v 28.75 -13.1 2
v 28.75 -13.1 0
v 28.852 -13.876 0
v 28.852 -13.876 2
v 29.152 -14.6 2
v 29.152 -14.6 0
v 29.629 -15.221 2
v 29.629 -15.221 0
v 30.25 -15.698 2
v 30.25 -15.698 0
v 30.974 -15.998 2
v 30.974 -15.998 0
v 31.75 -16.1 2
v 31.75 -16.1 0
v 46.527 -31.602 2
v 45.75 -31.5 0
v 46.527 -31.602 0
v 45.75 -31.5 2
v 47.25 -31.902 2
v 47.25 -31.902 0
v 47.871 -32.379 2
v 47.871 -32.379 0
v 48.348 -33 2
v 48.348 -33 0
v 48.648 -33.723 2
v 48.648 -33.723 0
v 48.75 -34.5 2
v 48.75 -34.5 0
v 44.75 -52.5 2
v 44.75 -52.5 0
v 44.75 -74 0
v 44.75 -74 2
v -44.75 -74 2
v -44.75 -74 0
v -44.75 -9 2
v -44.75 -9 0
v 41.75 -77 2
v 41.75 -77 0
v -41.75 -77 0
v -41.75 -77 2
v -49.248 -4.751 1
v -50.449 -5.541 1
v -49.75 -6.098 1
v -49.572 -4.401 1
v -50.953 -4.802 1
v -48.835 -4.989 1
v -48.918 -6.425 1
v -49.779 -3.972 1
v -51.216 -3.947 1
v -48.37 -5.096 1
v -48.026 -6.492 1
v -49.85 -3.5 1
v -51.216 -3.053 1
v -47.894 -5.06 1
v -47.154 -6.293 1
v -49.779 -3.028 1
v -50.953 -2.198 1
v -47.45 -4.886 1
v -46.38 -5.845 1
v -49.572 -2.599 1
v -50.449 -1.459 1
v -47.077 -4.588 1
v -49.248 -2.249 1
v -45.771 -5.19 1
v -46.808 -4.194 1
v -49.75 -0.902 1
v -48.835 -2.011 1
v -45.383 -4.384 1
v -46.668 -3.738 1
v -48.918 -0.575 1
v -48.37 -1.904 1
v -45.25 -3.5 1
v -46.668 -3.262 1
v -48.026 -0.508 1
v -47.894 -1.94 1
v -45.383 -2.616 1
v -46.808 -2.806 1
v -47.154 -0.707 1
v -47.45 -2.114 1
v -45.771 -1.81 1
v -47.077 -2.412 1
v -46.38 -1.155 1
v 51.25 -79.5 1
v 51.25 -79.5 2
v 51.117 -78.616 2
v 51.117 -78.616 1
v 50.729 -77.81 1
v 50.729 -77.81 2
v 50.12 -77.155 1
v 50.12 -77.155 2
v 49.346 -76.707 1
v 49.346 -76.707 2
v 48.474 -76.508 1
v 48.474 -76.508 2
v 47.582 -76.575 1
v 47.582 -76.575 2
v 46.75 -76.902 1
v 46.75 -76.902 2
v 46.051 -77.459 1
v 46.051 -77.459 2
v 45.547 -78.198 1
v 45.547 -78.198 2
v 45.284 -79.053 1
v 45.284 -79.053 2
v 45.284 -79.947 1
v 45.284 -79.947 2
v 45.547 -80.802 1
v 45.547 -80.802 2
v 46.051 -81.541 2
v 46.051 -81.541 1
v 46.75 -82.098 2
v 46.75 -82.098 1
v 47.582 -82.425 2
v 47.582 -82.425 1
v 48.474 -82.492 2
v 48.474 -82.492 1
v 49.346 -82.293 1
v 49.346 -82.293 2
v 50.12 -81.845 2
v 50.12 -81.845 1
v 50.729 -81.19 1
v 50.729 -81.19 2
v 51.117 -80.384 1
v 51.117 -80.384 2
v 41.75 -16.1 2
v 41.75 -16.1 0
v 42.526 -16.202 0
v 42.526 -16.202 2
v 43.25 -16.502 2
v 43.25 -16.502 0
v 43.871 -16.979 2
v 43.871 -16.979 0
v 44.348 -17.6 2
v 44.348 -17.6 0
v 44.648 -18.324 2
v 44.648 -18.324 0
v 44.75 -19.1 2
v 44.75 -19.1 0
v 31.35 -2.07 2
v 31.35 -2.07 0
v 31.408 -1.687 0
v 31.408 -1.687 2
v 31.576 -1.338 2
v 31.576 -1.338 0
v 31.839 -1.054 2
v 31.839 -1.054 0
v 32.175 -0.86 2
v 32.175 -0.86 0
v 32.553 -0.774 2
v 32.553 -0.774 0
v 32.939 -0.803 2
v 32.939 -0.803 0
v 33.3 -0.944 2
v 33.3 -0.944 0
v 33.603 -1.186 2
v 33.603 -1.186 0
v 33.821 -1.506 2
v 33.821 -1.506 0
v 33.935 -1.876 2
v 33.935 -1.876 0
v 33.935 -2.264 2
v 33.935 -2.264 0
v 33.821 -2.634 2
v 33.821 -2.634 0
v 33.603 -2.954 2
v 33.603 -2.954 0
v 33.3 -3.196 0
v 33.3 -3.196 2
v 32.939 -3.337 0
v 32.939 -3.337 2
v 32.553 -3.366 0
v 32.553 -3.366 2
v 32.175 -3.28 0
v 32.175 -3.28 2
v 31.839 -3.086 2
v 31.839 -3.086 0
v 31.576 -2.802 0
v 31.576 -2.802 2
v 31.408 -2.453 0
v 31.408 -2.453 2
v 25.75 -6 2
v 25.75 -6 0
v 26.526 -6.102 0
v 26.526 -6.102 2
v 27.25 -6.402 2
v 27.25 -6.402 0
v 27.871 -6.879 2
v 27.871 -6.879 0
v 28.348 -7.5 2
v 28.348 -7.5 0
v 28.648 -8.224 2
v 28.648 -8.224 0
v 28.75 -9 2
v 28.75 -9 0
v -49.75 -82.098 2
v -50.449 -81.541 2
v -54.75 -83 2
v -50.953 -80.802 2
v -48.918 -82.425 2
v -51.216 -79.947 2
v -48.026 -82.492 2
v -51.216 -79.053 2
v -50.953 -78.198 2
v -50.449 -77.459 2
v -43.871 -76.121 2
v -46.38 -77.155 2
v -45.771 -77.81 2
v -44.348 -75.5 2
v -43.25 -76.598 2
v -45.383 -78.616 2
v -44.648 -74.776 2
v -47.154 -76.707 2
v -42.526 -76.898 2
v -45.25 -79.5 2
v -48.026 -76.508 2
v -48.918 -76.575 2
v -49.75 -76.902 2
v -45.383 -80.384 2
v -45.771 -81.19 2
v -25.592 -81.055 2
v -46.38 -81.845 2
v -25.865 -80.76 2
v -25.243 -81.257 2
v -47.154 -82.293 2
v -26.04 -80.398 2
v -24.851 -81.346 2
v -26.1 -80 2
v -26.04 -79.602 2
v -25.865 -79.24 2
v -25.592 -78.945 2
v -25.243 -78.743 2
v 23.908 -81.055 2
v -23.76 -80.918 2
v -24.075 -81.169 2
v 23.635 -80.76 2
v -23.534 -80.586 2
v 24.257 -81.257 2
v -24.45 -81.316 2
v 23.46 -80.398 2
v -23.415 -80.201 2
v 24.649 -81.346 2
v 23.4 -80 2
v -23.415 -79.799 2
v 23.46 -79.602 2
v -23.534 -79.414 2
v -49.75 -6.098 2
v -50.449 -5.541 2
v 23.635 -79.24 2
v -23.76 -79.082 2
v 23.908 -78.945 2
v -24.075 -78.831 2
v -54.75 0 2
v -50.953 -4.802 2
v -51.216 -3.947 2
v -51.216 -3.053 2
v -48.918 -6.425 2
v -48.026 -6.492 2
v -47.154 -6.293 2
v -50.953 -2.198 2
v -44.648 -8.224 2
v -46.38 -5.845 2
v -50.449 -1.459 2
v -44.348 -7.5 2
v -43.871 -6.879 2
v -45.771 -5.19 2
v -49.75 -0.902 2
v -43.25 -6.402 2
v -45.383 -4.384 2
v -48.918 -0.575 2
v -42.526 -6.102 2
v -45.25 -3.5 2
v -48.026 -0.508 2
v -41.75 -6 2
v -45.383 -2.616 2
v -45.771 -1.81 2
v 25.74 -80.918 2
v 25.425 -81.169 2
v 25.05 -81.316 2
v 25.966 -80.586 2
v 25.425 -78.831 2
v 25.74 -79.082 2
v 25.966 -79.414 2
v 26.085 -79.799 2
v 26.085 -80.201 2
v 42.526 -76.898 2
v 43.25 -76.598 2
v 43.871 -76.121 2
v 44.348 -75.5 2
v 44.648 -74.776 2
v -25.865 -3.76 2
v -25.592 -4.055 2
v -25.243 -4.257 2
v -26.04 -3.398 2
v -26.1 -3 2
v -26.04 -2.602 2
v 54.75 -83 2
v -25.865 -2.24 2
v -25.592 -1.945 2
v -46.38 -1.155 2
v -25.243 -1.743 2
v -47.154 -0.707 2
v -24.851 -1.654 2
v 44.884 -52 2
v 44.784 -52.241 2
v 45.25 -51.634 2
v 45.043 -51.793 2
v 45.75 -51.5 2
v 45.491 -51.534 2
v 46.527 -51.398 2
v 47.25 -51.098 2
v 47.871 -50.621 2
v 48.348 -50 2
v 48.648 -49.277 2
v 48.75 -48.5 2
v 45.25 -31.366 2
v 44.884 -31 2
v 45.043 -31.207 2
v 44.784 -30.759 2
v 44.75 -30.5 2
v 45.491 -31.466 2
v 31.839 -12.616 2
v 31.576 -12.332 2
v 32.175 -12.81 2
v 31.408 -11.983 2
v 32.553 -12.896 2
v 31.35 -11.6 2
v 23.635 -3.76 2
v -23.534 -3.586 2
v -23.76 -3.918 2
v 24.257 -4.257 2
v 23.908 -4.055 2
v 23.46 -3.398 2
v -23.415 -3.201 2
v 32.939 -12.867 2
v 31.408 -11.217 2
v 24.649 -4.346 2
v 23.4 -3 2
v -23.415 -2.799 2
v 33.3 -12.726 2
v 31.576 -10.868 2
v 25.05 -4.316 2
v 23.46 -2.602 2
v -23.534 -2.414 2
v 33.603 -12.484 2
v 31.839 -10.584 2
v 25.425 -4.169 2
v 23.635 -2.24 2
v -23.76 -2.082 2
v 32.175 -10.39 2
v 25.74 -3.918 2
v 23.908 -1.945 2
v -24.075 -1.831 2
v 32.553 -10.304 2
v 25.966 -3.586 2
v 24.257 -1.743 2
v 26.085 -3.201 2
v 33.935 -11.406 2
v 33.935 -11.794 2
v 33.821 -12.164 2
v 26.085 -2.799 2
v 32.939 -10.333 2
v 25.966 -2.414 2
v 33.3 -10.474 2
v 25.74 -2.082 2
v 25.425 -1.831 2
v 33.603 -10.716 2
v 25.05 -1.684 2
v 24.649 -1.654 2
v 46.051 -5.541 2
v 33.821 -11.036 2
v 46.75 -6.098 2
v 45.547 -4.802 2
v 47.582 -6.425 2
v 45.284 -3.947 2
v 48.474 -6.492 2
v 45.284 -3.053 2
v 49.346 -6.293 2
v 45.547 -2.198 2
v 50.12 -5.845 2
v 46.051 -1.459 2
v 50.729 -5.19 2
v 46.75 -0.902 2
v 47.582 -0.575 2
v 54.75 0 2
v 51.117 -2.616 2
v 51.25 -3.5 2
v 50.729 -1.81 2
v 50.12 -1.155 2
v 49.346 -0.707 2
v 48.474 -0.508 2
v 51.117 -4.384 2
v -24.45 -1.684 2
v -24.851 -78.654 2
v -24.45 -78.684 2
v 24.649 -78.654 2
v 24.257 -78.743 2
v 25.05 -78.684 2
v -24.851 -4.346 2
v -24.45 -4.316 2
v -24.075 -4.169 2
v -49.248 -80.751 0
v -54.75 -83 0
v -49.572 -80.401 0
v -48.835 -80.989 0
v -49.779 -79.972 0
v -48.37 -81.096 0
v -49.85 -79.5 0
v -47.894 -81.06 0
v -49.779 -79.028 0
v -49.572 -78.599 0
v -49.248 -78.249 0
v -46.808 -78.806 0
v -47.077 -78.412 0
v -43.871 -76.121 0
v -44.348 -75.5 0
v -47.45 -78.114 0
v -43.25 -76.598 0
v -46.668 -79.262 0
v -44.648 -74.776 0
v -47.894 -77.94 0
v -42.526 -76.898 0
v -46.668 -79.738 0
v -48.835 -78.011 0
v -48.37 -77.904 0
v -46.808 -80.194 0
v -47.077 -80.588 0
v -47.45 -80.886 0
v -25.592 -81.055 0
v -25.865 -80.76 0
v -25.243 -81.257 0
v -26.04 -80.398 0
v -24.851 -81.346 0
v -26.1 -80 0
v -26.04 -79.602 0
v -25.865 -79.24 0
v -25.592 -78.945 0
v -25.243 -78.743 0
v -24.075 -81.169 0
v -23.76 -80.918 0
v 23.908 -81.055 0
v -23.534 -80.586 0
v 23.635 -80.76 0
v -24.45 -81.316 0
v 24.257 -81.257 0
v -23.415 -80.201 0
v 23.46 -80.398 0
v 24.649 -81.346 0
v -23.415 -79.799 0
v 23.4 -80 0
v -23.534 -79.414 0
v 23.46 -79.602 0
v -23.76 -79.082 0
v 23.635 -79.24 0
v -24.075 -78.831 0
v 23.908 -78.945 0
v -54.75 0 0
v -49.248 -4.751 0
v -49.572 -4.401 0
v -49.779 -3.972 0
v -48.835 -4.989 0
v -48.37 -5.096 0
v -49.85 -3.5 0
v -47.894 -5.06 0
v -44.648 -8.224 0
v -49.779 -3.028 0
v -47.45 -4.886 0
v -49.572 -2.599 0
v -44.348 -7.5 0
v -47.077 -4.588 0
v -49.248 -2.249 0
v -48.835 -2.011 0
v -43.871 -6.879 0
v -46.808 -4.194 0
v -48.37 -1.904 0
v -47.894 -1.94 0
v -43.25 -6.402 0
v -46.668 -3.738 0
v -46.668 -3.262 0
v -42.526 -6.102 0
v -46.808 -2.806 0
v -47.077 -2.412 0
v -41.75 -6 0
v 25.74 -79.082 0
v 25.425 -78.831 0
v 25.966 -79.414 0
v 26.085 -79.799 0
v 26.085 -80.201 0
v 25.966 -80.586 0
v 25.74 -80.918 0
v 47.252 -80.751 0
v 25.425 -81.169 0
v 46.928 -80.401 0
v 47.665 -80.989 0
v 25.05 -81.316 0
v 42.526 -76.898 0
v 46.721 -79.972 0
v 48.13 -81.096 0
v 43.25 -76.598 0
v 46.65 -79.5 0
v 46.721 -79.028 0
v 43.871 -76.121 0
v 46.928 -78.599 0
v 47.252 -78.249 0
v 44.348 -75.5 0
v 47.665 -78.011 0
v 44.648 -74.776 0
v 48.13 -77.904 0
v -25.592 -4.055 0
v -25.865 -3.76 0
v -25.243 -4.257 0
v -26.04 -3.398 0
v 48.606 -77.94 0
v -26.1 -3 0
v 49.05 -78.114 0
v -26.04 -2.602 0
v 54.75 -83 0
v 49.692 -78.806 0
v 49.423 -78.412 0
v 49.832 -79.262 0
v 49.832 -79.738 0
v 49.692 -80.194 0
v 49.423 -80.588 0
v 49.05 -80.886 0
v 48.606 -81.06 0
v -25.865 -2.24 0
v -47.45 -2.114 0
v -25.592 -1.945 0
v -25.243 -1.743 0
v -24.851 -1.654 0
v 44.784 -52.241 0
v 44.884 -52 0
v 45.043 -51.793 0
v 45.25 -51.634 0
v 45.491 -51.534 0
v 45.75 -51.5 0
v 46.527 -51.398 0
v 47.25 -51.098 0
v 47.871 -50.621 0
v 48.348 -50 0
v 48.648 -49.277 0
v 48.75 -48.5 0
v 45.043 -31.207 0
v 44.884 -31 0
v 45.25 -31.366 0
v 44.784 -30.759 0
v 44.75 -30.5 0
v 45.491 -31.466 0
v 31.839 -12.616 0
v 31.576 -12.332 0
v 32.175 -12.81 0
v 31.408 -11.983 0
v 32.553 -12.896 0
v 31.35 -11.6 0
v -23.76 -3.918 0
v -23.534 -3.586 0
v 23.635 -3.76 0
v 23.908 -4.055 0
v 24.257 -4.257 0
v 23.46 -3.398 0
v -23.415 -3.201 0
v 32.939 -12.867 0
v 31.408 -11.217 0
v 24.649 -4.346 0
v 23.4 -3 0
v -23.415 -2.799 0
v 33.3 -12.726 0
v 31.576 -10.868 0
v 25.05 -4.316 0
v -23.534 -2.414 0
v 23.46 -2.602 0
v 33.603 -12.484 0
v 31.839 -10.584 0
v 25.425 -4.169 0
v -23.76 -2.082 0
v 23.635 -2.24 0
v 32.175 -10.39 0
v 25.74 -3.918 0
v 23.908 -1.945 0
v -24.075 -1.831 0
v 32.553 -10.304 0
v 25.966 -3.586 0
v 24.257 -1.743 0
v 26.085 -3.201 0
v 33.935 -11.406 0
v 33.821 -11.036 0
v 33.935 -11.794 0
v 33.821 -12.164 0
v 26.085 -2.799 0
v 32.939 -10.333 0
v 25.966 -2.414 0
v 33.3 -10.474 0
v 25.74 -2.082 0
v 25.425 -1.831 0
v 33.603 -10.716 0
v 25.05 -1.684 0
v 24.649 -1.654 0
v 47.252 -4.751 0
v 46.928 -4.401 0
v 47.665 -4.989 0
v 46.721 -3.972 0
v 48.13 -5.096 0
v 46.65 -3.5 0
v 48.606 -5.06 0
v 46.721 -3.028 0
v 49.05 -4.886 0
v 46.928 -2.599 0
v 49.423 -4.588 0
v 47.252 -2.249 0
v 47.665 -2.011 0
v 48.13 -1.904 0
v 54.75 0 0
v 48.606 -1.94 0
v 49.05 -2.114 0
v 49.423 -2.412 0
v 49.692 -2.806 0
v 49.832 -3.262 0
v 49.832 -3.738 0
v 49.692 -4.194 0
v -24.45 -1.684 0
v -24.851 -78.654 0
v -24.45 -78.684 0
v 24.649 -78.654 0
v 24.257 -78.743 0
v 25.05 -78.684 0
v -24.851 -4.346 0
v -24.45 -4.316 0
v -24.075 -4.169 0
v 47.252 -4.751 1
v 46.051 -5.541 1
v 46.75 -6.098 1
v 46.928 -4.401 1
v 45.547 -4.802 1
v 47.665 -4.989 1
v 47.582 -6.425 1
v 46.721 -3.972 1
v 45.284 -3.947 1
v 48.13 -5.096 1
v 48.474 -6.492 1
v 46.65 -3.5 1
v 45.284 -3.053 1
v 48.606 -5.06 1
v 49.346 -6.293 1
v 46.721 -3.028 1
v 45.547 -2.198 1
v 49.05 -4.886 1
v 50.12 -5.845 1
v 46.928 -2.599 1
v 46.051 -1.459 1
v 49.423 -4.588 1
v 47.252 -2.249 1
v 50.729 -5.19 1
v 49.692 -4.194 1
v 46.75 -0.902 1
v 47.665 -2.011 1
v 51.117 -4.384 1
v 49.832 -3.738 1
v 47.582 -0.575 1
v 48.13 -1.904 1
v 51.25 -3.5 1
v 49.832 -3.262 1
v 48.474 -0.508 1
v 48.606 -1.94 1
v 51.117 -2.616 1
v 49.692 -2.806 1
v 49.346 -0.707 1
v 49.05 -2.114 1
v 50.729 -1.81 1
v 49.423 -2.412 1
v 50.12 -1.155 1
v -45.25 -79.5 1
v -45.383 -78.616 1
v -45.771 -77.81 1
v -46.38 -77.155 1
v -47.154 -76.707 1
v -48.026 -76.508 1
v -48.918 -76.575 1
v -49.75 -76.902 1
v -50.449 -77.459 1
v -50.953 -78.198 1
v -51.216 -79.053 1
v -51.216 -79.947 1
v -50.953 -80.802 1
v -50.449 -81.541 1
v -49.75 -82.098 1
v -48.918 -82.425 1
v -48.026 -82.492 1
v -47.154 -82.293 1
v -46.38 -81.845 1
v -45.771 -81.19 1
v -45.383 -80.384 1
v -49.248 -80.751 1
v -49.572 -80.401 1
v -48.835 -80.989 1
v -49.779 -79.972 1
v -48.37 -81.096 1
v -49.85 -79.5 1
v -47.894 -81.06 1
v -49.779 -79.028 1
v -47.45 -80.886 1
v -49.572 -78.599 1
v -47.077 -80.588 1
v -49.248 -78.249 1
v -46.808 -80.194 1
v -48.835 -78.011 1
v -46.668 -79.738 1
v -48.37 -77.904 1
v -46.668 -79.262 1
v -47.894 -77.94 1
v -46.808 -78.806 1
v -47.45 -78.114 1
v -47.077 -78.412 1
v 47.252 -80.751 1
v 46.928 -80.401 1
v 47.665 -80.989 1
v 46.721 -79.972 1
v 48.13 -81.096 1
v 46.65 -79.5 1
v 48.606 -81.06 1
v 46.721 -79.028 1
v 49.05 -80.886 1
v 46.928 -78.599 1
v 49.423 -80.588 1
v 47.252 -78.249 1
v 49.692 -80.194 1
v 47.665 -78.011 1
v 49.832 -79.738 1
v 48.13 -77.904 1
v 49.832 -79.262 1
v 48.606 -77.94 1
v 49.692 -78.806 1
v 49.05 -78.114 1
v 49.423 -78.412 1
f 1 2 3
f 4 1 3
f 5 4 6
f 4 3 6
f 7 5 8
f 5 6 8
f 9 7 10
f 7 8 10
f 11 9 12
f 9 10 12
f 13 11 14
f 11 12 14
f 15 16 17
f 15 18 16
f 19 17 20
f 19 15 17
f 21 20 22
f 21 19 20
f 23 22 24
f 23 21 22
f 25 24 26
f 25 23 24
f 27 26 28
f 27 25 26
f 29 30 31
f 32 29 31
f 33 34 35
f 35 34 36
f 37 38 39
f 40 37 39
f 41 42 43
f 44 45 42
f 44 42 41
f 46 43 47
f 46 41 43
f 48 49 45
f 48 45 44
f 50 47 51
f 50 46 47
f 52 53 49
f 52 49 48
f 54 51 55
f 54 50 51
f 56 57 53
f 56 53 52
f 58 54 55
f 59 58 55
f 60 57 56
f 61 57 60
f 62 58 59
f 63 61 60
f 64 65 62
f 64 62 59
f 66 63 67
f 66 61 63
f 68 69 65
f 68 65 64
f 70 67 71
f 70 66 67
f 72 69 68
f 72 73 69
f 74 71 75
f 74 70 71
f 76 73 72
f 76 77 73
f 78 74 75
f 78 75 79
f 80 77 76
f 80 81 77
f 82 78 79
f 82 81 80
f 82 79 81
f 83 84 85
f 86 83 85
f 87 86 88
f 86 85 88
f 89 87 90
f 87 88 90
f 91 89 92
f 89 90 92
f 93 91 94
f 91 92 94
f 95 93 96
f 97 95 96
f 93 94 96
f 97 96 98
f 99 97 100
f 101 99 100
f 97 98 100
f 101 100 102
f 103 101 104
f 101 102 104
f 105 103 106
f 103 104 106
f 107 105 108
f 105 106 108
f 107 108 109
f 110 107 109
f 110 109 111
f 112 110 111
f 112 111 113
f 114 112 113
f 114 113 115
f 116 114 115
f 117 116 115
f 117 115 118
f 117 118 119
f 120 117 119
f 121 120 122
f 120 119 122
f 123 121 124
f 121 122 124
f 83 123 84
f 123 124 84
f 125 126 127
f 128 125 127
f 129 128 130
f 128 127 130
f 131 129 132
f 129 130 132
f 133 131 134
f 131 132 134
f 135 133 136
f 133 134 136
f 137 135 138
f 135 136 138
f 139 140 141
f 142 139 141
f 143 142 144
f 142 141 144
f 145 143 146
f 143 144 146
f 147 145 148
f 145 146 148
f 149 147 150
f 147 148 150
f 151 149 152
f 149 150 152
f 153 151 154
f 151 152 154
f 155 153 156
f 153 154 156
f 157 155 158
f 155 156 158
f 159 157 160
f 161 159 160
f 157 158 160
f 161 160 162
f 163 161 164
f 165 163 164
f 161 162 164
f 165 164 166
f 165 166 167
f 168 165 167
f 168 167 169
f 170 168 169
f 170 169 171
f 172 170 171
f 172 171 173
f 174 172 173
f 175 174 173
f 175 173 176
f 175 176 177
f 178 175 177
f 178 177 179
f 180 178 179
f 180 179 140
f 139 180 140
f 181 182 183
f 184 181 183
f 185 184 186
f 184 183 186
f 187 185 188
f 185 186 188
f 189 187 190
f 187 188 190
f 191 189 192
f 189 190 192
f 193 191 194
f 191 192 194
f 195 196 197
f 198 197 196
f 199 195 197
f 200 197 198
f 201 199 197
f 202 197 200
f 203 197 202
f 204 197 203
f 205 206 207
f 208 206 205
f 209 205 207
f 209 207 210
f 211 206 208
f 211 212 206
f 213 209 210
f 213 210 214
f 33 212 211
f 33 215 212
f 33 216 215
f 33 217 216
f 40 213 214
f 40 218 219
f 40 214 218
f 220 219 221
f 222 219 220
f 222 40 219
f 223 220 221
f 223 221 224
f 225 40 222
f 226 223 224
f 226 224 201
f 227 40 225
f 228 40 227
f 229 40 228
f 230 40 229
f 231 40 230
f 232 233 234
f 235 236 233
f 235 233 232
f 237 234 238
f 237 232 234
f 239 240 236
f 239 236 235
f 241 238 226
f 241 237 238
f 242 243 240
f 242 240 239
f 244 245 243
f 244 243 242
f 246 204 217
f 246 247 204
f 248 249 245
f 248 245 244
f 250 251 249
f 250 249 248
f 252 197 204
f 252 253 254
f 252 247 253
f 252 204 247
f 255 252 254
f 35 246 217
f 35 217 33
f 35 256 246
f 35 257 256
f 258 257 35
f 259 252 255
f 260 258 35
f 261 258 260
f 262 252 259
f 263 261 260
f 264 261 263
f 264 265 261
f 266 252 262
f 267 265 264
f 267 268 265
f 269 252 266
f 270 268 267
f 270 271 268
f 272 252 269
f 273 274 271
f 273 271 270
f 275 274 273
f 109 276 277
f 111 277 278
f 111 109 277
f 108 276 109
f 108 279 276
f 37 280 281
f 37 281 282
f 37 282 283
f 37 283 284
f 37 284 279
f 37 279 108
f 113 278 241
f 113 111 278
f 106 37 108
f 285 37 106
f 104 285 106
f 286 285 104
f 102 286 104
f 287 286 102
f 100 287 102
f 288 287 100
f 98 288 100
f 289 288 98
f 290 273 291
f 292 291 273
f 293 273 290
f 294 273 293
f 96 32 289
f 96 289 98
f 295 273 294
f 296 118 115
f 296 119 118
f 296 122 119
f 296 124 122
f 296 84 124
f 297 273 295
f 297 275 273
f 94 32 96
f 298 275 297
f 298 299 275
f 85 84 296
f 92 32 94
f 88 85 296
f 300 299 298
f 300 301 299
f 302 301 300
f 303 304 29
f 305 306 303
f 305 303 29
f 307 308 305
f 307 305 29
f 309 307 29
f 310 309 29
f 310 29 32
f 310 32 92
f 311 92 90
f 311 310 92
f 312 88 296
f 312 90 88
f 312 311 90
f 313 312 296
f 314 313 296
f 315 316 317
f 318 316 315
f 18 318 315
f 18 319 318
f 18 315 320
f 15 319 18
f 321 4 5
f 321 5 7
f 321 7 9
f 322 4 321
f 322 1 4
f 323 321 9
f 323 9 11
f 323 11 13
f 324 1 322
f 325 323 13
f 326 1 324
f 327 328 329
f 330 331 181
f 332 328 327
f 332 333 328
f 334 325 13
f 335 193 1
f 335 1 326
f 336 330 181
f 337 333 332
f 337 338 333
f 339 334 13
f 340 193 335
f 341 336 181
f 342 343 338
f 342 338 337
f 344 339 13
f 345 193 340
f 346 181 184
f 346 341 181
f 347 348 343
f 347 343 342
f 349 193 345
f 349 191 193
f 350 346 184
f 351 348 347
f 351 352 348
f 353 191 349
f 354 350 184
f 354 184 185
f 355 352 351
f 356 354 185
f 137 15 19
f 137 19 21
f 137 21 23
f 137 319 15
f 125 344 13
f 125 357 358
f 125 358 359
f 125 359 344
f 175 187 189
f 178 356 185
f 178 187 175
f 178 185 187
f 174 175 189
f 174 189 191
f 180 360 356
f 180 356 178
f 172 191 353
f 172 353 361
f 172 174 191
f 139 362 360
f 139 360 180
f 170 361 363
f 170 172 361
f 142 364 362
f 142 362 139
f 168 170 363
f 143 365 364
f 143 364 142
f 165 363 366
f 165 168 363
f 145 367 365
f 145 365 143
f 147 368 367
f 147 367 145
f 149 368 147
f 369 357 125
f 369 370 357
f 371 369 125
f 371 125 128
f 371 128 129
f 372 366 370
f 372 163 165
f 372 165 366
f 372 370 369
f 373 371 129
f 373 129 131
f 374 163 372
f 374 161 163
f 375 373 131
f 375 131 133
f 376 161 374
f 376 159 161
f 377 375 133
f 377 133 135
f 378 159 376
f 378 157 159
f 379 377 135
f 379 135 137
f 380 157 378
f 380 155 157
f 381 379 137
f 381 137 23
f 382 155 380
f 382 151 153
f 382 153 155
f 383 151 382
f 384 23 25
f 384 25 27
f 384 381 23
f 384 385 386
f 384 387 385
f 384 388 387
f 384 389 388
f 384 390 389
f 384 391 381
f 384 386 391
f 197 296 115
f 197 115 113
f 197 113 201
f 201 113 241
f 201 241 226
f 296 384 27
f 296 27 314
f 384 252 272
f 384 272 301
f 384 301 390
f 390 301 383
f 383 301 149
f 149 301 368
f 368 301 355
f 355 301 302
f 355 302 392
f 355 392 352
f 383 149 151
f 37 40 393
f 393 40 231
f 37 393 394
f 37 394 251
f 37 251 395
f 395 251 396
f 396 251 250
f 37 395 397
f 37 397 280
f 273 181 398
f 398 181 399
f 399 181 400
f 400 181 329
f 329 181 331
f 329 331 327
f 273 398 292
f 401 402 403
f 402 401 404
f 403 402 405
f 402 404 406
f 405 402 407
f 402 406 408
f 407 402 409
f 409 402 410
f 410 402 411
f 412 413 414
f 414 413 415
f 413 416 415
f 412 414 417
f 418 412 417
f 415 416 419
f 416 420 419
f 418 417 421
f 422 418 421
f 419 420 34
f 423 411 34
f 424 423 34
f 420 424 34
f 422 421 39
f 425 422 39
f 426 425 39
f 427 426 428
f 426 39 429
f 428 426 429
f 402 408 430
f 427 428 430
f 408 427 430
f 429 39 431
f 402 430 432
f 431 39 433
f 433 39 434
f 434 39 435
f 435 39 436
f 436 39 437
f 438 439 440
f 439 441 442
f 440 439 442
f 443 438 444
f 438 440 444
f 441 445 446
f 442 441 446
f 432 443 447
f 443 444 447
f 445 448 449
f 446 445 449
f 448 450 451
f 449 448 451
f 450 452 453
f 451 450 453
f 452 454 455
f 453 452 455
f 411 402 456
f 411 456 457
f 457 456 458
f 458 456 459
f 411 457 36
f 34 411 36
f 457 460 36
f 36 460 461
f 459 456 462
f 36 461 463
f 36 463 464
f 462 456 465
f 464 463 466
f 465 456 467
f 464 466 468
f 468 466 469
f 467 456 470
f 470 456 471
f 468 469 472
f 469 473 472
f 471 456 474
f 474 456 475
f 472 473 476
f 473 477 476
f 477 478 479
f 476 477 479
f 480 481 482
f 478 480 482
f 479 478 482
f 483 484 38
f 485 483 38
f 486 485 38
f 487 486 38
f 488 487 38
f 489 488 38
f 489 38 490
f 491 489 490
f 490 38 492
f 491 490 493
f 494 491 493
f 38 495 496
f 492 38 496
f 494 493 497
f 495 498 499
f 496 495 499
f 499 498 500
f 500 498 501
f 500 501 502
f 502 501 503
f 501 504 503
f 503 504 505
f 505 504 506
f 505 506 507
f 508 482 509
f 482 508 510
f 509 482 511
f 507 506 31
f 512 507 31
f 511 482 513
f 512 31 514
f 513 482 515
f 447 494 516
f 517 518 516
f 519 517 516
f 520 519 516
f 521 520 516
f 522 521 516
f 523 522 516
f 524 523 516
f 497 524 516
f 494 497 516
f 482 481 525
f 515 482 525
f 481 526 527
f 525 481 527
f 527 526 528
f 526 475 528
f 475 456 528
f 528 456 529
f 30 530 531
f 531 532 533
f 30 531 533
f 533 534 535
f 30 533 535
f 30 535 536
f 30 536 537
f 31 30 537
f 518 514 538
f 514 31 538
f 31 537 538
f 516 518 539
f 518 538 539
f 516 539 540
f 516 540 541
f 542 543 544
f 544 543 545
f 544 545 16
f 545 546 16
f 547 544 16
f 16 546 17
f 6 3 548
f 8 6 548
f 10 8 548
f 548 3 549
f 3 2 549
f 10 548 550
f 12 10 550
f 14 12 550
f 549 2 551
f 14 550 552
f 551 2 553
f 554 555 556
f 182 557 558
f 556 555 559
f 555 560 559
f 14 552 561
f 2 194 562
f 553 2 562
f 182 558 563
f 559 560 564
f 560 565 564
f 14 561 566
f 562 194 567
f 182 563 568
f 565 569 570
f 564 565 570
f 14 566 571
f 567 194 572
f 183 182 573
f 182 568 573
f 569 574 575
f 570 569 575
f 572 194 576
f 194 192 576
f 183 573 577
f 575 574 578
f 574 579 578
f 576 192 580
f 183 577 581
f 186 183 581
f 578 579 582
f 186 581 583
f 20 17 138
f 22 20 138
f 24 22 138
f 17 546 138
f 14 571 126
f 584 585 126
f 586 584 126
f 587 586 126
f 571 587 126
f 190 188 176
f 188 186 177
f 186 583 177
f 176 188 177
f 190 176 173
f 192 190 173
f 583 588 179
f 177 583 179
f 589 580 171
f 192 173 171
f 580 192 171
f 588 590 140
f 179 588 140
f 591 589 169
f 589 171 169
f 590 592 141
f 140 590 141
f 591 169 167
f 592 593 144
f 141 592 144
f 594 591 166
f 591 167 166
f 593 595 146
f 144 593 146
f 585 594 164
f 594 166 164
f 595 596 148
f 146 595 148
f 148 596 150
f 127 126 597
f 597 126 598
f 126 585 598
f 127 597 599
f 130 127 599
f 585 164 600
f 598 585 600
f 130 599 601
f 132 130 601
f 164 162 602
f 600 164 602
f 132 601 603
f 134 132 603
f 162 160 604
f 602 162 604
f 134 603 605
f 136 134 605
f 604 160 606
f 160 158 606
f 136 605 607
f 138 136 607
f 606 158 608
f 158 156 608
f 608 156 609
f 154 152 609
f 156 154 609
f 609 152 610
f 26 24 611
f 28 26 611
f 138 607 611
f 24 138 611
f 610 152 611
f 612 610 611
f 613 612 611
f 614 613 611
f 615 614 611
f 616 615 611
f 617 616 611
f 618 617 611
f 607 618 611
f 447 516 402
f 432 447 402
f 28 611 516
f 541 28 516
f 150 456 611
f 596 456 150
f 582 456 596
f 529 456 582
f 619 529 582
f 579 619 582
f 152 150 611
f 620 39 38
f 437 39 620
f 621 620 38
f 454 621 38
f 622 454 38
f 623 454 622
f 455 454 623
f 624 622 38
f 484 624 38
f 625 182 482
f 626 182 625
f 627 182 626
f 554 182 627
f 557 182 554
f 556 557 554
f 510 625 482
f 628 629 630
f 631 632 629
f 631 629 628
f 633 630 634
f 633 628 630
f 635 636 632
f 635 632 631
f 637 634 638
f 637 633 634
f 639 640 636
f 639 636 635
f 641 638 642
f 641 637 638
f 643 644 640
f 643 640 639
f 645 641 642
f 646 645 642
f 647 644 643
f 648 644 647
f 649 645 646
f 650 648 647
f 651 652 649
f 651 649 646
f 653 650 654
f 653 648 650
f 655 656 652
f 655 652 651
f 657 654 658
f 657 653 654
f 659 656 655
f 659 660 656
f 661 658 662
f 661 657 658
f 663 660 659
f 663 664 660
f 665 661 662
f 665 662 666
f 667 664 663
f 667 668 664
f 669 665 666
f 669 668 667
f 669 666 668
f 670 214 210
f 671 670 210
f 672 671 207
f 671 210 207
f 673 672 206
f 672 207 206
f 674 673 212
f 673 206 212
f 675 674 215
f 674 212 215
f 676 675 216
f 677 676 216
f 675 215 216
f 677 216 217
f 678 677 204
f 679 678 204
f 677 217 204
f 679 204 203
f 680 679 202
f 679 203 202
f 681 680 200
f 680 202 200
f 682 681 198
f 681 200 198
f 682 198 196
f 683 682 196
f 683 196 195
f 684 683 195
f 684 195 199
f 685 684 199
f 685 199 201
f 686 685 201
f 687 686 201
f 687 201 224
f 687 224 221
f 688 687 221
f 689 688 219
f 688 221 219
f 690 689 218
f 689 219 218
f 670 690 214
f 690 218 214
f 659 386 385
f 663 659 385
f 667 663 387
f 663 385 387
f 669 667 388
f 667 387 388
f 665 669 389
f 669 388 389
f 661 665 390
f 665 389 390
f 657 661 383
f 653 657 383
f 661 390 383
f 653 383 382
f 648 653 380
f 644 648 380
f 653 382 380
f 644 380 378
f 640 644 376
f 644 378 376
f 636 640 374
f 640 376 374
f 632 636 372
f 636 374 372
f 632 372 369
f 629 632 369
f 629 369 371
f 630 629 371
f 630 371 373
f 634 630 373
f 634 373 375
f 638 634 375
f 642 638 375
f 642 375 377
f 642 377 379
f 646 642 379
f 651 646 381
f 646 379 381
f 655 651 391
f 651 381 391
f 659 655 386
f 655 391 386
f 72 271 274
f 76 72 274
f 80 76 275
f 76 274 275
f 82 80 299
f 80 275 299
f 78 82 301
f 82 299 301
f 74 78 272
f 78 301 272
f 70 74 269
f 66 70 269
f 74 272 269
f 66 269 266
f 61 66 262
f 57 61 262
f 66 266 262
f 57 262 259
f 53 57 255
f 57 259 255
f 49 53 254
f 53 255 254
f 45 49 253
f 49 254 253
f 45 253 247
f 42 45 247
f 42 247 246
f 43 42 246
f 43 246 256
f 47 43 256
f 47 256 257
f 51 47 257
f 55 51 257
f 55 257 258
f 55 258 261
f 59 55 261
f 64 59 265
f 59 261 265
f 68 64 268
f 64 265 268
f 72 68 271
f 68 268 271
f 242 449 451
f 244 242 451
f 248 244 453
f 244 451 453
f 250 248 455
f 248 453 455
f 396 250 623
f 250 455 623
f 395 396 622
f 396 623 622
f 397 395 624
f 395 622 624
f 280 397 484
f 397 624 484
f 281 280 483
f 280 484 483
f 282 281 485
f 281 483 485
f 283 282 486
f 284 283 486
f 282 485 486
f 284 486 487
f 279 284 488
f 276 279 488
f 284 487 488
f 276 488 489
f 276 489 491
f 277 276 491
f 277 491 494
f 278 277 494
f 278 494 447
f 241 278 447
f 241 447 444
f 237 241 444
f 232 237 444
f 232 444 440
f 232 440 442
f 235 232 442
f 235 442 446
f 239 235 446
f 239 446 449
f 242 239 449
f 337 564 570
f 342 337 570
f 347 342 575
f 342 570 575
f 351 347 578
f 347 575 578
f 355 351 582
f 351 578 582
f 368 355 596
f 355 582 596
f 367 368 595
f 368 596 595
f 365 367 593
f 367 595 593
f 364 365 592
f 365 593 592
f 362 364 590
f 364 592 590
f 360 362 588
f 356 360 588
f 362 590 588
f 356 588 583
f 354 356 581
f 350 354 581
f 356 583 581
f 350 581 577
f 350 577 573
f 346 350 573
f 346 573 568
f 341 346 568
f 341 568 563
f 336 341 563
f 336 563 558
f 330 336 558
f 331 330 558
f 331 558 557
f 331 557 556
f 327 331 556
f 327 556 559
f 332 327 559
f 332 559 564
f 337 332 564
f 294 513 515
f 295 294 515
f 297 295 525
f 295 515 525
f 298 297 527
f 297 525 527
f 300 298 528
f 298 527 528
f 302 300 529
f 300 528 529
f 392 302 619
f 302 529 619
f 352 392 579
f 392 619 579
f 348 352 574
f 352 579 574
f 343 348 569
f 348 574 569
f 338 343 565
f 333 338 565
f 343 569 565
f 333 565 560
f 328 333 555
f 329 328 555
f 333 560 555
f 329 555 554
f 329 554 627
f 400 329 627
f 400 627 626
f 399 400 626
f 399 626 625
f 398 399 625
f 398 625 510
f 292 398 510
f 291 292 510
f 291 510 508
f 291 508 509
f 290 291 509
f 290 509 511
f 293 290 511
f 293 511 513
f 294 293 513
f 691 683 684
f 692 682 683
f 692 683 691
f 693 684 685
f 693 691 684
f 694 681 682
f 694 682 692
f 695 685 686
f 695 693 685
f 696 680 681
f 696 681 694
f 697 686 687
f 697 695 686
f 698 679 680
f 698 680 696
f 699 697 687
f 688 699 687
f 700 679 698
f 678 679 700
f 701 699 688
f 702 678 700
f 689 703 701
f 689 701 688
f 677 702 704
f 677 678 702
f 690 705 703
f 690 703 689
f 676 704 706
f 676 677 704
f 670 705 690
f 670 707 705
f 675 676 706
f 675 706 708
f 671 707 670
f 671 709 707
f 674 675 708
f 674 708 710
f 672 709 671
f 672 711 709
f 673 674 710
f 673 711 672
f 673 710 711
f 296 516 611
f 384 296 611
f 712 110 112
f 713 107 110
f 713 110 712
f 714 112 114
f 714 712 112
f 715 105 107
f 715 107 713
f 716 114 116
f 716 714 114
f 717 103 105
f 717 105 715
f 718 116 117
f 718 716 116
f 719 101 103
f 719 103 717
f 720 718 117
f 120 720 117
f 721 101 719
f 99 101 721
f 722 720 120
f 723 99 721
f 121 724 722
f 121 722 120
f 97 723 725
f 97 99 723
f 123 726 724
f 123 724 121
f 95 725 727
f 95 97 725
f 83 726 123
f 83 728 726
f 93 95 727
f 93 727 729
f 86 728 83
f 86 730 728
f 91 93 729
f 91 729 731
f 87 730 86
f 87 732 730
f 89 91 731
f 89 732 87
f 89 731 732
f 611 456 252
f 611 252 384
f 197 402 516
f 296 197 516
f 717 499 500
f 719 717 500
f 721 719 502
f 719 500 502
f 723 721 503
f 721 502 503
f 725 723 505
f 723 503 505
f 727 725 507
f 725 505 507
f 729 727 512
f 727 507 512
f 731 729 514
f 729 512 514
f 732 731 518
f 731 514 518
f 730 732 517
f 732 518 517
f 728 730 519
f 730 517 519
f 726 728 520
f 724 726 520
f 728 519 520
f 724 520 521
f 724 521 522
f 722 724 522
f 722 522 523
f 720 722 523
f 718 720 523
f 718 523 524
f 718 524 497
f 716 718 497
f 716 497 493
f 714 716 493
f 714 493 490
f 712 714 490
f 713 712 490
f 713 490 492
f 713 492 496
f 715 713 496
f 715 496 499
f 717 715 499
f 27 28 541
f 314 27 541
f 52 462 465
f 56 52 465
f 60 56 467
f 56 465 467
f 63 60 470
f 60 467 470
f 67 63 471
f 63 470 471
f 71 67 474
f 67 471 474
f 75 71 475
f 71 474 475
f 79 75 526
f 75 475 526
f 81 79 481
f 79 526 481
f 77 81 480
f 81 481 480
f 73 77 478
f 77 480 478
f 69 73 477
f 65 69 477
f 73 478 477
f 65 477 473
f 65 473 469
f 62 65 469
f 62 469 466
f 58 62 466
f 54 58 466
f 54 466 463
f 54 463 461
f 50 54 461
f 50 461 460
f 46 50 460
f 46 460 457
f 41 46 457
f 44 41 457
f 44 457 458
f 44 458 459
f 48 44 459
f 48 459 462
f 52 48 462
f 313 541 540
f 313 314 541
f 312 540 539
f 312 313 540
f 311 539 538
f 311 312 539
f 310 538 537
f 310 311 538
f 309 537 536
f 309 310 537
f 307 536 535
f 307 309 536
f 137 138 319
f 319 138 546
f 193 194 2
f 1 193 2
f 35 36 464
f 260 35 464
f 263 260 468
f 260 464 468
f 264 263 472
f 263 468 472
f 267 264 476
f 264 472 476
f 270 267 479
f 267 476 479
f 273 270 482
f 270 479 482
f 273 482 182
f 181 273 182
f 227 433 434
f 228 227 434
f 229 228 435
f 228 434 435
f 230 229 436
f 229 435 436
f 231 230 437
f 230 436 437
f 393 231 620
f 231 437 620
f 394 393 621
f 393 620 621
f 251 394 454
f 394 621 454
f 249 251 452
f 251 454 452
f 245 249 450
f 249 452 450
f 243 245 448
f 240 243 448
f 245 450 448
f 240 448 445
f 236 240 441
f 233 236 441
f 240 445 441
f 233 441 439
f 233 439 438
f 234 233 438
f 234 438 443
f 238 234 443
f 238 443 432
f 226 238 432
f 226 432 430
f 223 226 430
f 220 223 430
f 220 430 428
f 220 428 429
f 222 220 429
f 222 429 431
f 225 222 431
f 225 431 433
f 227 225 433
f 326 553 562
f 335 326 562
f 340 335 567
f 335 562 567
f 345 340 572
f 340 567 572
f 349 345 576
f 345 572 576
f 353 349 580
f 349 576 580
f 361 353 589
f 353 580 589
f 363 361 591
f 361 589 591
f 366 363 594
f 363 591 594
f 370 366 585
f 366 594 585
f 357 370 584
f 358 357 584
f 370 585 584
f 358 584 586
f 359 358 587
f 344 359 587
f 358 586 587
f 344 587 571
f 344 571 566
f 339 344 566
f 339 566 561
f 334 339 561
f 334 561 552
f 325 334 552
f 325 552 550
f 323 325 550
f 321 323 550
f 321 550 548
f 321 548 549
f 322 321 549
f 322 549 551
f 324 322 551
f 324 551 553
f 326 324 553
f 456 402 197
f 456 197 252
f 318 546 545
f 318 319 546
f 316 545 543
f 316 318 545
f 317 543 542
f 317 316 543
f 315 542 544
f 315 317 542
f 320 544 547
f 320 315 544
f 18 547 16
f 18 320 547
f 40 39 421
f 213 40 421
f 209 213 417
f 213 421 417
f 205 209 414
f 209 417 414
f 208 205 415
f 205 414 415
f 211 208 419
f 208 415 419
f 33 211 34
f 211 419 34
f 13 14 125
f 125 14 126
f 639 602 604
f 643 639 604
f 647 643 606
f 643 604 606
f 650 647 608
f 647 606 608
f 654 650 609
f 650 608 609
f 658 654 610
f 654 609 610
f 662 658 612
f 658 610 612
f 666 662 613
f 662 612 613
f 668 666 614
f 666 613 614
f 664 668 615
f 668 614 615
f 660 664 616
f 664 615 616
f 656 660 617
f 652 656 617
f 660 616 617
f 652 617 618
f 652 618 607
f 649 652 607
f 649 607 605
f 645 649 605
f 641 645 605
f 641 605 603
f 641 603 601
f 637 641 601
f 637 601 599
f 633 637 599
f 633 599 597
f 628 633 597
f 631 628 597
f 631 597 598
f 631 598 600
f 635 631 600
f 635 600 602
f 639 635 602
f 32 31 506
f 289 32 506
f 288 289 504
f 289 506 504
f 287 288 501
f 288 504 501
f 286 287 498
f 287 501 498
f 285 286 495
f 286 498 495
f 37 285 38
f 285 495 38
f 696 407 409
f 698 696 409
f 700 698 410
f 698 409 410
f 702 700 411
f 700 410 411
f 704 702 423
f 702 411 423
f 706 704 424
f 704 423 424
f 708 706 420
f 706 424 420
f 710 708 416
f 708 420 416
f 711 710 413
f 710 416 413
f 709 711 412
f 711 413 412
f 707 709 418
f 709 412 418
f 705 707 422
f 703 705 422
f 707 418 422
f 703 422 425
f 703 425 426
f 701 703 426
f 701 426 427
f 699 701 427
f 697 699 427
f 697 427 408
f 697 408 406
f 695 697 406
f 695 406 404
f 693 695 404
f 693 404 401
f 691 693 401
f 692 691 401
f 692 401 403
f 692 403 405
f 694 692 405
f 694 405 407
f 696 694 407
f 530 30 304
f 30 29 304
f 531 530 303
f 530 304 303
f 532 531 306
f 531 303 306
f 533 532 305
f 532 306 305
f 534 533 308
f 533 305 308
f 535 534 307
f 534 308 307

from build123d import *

# Parameters (mm, degrees)
SKETCH1_W                  = 109.5
SKETCH1_H                  = 83
BOSS_EXTRUDE1_DEPTH        = 2
F_3_2_3_2_DIAMETER_HOLE2_D = 3.2
F_2_6_2_6_DIAMETER_HOLE2_D = 2.6
F_2_6_2_6_DIAMETER_HOLE1_D = 2.6
SKETCH9_R                  = 3
CUT_EXTRUDE1_DEPTH         = 1
F_2_7_2_7_DIAMETER_HOLE1_D = 2.7
FILLET1_R                  = 1
FILLET2_R                  = 3


with BuildPart() as part:
    # Sketch1 → Boss-Extrude1 (new body)
    with BuildSketch(Plane.XY):
        with Locations((0, -41.5)):
            Rectangle(SKETCH1_W, SKETCH1_H)
        with BuildLine():
            Line((28.75, -9), (28.75, -13.1))
            ThreePointArc((28.75, -13.1), (29.628679656, -15.221320344), (31.75, -16.1))
            Line((31.75, -16.1), (41.75, -16.1))
            ThreePointArc((41.75, -16.1), (43.871320344, -16.978679656), (44.75, -19.1))
            Line((44.75, -19.1), (44.75, -31.5))
            Line((44.75, -31.5), (48.75, -31.5))
            Line((48.75, -31.5), (48.75, -41.5))
            Line((48.75, -41.5), (48.75, -51.5))
            Line((48.75, -51.5), (44.75, -51.5))
            Line((44.75, -51.5), (44.75, -74))
            ThreePointArc((44.75, -74), (43.871320344, -76.121320344), (41.75, -77))
            Line((41.75, -77), (-41.75, -77))
            ThreePointArc((-41.75, -77), (-43.871320344, -76.121320344), (-44.75, -74))
            Line((-44.75, -74), (-44.75, -9))
            ThreePointArc((-44.75, -9), (-43.871320344, -6.878679656), (-41.75, -6))
            Line((-41.75, -6), (25.75, -6))
            ThreePointArc((25.75, -6), (27.871320344, -6.878679656), (28.75, -9))
        make_face(mode=Mode.SUBTRACT)
    extrude(amount=BOSS_EXTRUDE1_DEPTH)

    # Ø3.2 (3.2) Diameter Hole2 (through all)
    with Locations(Plane.XY.offset(2)):
        with Locations((-48.25, -3.5), (-48.25, -79.5), (48.25, -79.5), (48.25, -3.5)):
            Hole(F_3_2_3_2_DIAMETER_HOLE2_D / 2)

    # Ø2.6 (2.6) Diameter Hole2 (through all)
    with Locations(Plane.XY.offset(2)):
        with Locations((32.65, -11.6)):
            Hole(F_2_6_2_6_DIAMETER_HOLE2_D / 2)

    # Ø2.6 (2.6) Diameter Hole1 (through all)
    with Locations(Plane.XY.offset(2)):
        with Locations((32.65, -2.07)):
            Hole(F_2_6_2_6_DIAMETER_HOLE1_D / 2)

    # Sketch9 → Cut-Extrude1 (cut)
    with BuildSketch(Plane.XY.offset(2)):
        with Locations((-48.25, -3.5)):
            Circle(SKETCH9_R)
        with Locations((48.25, -3.5)):
            Circle(SKETCH9_R)
        with Locations((48.25, -79.5)):
            Circle(SKETCH9_R)
        with Locations((-48.25, -79.5)):
            Circle(SKETCH9_R)
    extrude(amount=-CUT_EXTRUDE1_DEPTH, mode=Mode.SUBTRACT)

    # Ø2.7 (2.7) Diameter Hole1 (through all)
    with Locations(Plane.XY.offset(2)):
        with Locations((-24.75, -3), (24.75, -3), (-24.75, -80), (24.75, -80)):
            Hole(F_2_7_2_7_DIAMETER_HOLE1_D / 2)

    # Fillet1
    fillet1_edges = [part.edges().sort_by_distance(p)[0] for p in [
        (44.75, -51.5, 1),
        (44.75, -31.5, 1),
    ]]
    fillet(fillet1_edges, radius=FILLET1_R)

    # Fillet2
    fillet2_edges = [part.edges().sort_by_distance(p)[0] for p in [
        (48.75, -31.5, 1),
        (48.75, -51.5, 1),
    ]]
    fillet(fillet2_edges, radius=FILLET2_R - 0.0001)  # a hair under: the kernel refuses the full size


solid = part.part
